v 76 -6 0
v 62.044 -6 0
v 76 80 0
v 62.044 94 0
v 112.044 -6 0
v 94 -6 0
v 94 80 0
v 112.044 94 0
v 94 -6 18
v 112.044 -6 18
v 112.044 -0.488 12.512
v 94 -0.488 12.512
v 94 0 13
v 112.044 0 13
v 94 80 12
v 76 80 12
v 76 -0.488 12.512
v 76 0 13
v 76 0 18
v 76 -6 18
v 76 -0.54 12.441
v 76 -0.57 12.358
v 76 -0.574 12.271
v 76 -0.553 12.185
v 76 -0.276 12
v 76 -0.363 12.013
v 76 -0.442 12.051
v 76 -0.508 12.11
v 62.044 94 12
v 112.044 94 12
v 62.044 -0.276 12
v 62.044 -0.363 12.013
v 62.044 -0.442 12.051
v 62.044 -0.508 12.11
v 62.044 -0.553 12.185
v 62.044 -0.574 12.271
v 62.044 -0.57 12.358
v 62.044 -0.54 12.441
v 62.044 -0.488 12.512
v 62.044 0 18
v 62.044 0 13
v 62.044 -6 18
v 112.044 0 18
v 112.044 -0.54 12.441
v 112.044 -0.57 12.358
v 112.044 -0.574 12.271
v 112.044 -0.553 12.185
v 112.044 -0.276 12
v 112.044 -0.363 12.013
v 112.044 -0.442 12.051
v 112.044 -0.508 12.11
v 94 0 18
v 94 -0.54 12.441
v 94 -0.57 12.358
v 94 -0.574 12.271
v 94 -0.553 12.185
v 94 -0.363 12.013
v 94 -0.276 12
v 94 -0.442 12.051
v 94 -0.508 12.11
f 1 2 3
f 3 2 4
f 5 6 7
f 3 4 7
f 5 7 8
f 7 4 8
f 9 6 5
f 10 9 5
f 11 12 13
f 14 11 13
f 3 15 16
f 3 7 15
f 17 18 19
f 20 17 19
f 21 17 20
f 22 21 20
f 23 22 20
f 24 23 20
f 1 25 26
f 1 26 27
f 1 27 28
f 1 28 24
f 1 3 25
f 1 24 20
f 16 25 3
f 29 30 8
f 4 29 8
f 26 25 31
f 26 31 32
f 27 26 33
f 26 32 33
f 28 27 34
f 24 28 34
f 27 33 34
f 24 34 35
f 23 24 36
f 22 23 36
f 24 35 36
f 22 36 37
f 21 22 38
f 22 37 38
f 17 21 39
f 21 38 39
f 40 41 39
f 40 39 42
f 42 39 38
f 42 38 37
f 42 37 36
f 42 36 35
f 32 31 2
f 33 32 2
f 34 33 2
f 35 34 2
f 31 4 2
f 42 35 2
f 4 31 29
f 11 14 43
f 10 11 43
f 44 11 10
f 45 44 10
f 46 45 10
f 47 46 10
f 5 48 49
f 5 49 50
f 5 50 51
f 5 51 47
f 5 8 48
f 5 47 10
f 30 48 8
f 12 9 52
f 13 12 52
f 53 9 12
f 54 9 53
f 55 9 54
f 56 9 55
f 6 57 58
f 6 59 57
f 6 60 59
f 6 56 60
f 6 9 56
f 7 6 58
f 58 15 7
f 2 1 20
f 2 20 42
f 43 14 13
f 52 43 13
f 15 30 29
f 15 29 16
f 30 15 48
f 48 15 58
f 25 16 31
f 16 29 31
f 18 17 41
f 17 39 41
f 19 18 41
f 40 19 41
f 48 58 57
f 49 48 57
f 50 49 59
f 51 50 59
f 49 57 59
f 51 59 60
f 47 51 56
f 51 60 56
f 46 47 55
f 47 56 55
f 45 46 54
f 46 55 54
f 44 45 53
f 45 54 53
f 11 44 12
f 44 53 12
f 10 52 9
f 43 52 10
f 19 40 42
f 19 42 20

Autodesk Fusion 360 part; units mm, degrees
sketch "Sketch2" plane through (0, 0, 0) normal (0, 0, 1) x (1, 0, 0) in component "jig"
  line L0 (0, 0) -> (0, 160)
  line L1 (0, 160) -> (134, 160)
  line L2 (134, 160) -> (134, 0)
  line L3 (134, 0) -> (0, 0)
  line L4 (40, 160) -> (58, 160)
  line L5 (58, 160) -> (58, 60)
  line L6 (58, 60) -> (40, 60)
  line L7 (40, 60) -> (40, 160)
  line L8 (76, 0) -> (94, 0)
  line L9 (94, 0) -> (94, 80)
  line L10 (94, 80) -> (76, 80)
  line L11 (76, 80) -> (76, 0)
  line L12 (76, 80) -> (58, 80) construction
  line L13 (0, 160) -> (40, 160)
  line L14 (40, 160) -> (40, 166)
  line L15 (40, 166) -> (0, 166)
  line L16 (0, 166) -> (0, 160)
  line L17 (134, 160) -> (58, 160)
  line L18 (58, 160) -> (58, 166)
  line L19 (58, 166) -> (134, 166)
  line L20 (134, 166) -> (134, 160)
  line L21 (0, 0) -> (76, 0)
  line L22 (76, 0) -> (76, -6)
  line L23 (76, -6) -> (0, -6)
  line L24 (0, -6) -> (0, 0)
  line L25 (134, 0) -> (94, 0)
  line L26 (94, 0) -> (94, -6)
  line L27 (94, -6) -> (134, -6)
  line L28 (134, -6) -> (134, 0)
  dimension "d18" = 18
  dimension "d21" = 80
  dimension "d22" = 60
  dimension "d23" = 80
  dimension "d25" = 40
  dimension "d27" = 40
  dimension "d28" = 6
  dimension "d29" = 6
extrude "Extrude1" add sketch "Sketch2" along normal blind 12 contours L0 L1 L2 L3 L5 L6 L7 L9 L10 L11 L13 L17 L21 L25 in component "jig"
extrude "Extrude2" add sketch "Sketch2" along normal blind 18 contours L3 L21 L22 L23 L24 | L1 L13 L14 L15 L16 | L3 L25 L26 L27 L28 | L1 L17 L18 L19 L20 in component "jig"
sketch "Sketch3" plane through (0, 0, 0) normal (-1, 0, 0) x (0, -1, 0) in component "jig"
  line L0 (-166, 0) -> (6, 0)
  line L1 (6, 0) -> (6, 18)
  line L2 (6, 18) -> (0, 18)
  line L3 (0, 18) -> (0, 12)
  line L4 (0, 12) -> (-160, 12)
  line L5 (-160, 12) -> (-160, 18)
  line L6 (-160, 18) -> (-166, 18)
  line L7 (-166, 18) -> (-166, 0)
  line L8 (-160, 13) -> (-160.4879, 12.5121)
  line L9 (-160.2757, 12) -> (-160, 12)
  line L10 (-160, 13) -> (-160, 12)
  arc A0 (-160.4879, 12.5121) -> (-160.2757, 12) centre (-160.2757, 12.3) ccw
  line L11 (0, 12) -> (0.2757, 12)
  line L12 (0.4879, 12.5121) -> (0, 13)
  line L13 (0, 12) -> (0, 13)
  arc A1 (0.2757, 12) -> (0.4879, 12.5121) centre (0.2757, 12.3) ccw
  dimension "d34" = 1
  dimension "d35" = 0.3
  dimension "d36" = 45
  dimension "d37" = 1
  dimension "d38" = 45
  dimension "d39" = 0.3
extrude "Extrude3" cut sketch "Sketch3" against normal up to surface (134 mm away) contours L5 L8 L9 L10 A0 | L3 L11 L12 L13 A1 in component "jig"
box "BoxPrimitive1" cut length 30 width 50 height -100 placed x (0, 0, -1) y (1, 0, 0) z (0, -1, 0) at (62.0445, -6, 30) keep common part in component "jig"
component "jig" placed x (1, 0, 0) y (0, 1, 0) z (0, 0, 1) at (0, 0, 0)
equation "stockW = 200 mm"
equation "stockH = 120 mm"
equation "stockT = 18 mm"
equation "lipT = stockT / 3"
equation "lipH = lipT"
equation "jigT = 12 mm"
equation "stock2H = 160 mm"
equation "d18 = stockT"
equation "d21 = stock2H / 2"
equation "d22 = stockH / 2"
equation "d23 = stock2H / 2"
equation "baseMargin = 40 mm"
equation "d25 = baseMargin"
equation "d27 = baseMargin"
equation "d28 = lipT"
equation "d29 = lipT"
equation "d30 = jigT"
equation "d32 = jigT + lipT"
